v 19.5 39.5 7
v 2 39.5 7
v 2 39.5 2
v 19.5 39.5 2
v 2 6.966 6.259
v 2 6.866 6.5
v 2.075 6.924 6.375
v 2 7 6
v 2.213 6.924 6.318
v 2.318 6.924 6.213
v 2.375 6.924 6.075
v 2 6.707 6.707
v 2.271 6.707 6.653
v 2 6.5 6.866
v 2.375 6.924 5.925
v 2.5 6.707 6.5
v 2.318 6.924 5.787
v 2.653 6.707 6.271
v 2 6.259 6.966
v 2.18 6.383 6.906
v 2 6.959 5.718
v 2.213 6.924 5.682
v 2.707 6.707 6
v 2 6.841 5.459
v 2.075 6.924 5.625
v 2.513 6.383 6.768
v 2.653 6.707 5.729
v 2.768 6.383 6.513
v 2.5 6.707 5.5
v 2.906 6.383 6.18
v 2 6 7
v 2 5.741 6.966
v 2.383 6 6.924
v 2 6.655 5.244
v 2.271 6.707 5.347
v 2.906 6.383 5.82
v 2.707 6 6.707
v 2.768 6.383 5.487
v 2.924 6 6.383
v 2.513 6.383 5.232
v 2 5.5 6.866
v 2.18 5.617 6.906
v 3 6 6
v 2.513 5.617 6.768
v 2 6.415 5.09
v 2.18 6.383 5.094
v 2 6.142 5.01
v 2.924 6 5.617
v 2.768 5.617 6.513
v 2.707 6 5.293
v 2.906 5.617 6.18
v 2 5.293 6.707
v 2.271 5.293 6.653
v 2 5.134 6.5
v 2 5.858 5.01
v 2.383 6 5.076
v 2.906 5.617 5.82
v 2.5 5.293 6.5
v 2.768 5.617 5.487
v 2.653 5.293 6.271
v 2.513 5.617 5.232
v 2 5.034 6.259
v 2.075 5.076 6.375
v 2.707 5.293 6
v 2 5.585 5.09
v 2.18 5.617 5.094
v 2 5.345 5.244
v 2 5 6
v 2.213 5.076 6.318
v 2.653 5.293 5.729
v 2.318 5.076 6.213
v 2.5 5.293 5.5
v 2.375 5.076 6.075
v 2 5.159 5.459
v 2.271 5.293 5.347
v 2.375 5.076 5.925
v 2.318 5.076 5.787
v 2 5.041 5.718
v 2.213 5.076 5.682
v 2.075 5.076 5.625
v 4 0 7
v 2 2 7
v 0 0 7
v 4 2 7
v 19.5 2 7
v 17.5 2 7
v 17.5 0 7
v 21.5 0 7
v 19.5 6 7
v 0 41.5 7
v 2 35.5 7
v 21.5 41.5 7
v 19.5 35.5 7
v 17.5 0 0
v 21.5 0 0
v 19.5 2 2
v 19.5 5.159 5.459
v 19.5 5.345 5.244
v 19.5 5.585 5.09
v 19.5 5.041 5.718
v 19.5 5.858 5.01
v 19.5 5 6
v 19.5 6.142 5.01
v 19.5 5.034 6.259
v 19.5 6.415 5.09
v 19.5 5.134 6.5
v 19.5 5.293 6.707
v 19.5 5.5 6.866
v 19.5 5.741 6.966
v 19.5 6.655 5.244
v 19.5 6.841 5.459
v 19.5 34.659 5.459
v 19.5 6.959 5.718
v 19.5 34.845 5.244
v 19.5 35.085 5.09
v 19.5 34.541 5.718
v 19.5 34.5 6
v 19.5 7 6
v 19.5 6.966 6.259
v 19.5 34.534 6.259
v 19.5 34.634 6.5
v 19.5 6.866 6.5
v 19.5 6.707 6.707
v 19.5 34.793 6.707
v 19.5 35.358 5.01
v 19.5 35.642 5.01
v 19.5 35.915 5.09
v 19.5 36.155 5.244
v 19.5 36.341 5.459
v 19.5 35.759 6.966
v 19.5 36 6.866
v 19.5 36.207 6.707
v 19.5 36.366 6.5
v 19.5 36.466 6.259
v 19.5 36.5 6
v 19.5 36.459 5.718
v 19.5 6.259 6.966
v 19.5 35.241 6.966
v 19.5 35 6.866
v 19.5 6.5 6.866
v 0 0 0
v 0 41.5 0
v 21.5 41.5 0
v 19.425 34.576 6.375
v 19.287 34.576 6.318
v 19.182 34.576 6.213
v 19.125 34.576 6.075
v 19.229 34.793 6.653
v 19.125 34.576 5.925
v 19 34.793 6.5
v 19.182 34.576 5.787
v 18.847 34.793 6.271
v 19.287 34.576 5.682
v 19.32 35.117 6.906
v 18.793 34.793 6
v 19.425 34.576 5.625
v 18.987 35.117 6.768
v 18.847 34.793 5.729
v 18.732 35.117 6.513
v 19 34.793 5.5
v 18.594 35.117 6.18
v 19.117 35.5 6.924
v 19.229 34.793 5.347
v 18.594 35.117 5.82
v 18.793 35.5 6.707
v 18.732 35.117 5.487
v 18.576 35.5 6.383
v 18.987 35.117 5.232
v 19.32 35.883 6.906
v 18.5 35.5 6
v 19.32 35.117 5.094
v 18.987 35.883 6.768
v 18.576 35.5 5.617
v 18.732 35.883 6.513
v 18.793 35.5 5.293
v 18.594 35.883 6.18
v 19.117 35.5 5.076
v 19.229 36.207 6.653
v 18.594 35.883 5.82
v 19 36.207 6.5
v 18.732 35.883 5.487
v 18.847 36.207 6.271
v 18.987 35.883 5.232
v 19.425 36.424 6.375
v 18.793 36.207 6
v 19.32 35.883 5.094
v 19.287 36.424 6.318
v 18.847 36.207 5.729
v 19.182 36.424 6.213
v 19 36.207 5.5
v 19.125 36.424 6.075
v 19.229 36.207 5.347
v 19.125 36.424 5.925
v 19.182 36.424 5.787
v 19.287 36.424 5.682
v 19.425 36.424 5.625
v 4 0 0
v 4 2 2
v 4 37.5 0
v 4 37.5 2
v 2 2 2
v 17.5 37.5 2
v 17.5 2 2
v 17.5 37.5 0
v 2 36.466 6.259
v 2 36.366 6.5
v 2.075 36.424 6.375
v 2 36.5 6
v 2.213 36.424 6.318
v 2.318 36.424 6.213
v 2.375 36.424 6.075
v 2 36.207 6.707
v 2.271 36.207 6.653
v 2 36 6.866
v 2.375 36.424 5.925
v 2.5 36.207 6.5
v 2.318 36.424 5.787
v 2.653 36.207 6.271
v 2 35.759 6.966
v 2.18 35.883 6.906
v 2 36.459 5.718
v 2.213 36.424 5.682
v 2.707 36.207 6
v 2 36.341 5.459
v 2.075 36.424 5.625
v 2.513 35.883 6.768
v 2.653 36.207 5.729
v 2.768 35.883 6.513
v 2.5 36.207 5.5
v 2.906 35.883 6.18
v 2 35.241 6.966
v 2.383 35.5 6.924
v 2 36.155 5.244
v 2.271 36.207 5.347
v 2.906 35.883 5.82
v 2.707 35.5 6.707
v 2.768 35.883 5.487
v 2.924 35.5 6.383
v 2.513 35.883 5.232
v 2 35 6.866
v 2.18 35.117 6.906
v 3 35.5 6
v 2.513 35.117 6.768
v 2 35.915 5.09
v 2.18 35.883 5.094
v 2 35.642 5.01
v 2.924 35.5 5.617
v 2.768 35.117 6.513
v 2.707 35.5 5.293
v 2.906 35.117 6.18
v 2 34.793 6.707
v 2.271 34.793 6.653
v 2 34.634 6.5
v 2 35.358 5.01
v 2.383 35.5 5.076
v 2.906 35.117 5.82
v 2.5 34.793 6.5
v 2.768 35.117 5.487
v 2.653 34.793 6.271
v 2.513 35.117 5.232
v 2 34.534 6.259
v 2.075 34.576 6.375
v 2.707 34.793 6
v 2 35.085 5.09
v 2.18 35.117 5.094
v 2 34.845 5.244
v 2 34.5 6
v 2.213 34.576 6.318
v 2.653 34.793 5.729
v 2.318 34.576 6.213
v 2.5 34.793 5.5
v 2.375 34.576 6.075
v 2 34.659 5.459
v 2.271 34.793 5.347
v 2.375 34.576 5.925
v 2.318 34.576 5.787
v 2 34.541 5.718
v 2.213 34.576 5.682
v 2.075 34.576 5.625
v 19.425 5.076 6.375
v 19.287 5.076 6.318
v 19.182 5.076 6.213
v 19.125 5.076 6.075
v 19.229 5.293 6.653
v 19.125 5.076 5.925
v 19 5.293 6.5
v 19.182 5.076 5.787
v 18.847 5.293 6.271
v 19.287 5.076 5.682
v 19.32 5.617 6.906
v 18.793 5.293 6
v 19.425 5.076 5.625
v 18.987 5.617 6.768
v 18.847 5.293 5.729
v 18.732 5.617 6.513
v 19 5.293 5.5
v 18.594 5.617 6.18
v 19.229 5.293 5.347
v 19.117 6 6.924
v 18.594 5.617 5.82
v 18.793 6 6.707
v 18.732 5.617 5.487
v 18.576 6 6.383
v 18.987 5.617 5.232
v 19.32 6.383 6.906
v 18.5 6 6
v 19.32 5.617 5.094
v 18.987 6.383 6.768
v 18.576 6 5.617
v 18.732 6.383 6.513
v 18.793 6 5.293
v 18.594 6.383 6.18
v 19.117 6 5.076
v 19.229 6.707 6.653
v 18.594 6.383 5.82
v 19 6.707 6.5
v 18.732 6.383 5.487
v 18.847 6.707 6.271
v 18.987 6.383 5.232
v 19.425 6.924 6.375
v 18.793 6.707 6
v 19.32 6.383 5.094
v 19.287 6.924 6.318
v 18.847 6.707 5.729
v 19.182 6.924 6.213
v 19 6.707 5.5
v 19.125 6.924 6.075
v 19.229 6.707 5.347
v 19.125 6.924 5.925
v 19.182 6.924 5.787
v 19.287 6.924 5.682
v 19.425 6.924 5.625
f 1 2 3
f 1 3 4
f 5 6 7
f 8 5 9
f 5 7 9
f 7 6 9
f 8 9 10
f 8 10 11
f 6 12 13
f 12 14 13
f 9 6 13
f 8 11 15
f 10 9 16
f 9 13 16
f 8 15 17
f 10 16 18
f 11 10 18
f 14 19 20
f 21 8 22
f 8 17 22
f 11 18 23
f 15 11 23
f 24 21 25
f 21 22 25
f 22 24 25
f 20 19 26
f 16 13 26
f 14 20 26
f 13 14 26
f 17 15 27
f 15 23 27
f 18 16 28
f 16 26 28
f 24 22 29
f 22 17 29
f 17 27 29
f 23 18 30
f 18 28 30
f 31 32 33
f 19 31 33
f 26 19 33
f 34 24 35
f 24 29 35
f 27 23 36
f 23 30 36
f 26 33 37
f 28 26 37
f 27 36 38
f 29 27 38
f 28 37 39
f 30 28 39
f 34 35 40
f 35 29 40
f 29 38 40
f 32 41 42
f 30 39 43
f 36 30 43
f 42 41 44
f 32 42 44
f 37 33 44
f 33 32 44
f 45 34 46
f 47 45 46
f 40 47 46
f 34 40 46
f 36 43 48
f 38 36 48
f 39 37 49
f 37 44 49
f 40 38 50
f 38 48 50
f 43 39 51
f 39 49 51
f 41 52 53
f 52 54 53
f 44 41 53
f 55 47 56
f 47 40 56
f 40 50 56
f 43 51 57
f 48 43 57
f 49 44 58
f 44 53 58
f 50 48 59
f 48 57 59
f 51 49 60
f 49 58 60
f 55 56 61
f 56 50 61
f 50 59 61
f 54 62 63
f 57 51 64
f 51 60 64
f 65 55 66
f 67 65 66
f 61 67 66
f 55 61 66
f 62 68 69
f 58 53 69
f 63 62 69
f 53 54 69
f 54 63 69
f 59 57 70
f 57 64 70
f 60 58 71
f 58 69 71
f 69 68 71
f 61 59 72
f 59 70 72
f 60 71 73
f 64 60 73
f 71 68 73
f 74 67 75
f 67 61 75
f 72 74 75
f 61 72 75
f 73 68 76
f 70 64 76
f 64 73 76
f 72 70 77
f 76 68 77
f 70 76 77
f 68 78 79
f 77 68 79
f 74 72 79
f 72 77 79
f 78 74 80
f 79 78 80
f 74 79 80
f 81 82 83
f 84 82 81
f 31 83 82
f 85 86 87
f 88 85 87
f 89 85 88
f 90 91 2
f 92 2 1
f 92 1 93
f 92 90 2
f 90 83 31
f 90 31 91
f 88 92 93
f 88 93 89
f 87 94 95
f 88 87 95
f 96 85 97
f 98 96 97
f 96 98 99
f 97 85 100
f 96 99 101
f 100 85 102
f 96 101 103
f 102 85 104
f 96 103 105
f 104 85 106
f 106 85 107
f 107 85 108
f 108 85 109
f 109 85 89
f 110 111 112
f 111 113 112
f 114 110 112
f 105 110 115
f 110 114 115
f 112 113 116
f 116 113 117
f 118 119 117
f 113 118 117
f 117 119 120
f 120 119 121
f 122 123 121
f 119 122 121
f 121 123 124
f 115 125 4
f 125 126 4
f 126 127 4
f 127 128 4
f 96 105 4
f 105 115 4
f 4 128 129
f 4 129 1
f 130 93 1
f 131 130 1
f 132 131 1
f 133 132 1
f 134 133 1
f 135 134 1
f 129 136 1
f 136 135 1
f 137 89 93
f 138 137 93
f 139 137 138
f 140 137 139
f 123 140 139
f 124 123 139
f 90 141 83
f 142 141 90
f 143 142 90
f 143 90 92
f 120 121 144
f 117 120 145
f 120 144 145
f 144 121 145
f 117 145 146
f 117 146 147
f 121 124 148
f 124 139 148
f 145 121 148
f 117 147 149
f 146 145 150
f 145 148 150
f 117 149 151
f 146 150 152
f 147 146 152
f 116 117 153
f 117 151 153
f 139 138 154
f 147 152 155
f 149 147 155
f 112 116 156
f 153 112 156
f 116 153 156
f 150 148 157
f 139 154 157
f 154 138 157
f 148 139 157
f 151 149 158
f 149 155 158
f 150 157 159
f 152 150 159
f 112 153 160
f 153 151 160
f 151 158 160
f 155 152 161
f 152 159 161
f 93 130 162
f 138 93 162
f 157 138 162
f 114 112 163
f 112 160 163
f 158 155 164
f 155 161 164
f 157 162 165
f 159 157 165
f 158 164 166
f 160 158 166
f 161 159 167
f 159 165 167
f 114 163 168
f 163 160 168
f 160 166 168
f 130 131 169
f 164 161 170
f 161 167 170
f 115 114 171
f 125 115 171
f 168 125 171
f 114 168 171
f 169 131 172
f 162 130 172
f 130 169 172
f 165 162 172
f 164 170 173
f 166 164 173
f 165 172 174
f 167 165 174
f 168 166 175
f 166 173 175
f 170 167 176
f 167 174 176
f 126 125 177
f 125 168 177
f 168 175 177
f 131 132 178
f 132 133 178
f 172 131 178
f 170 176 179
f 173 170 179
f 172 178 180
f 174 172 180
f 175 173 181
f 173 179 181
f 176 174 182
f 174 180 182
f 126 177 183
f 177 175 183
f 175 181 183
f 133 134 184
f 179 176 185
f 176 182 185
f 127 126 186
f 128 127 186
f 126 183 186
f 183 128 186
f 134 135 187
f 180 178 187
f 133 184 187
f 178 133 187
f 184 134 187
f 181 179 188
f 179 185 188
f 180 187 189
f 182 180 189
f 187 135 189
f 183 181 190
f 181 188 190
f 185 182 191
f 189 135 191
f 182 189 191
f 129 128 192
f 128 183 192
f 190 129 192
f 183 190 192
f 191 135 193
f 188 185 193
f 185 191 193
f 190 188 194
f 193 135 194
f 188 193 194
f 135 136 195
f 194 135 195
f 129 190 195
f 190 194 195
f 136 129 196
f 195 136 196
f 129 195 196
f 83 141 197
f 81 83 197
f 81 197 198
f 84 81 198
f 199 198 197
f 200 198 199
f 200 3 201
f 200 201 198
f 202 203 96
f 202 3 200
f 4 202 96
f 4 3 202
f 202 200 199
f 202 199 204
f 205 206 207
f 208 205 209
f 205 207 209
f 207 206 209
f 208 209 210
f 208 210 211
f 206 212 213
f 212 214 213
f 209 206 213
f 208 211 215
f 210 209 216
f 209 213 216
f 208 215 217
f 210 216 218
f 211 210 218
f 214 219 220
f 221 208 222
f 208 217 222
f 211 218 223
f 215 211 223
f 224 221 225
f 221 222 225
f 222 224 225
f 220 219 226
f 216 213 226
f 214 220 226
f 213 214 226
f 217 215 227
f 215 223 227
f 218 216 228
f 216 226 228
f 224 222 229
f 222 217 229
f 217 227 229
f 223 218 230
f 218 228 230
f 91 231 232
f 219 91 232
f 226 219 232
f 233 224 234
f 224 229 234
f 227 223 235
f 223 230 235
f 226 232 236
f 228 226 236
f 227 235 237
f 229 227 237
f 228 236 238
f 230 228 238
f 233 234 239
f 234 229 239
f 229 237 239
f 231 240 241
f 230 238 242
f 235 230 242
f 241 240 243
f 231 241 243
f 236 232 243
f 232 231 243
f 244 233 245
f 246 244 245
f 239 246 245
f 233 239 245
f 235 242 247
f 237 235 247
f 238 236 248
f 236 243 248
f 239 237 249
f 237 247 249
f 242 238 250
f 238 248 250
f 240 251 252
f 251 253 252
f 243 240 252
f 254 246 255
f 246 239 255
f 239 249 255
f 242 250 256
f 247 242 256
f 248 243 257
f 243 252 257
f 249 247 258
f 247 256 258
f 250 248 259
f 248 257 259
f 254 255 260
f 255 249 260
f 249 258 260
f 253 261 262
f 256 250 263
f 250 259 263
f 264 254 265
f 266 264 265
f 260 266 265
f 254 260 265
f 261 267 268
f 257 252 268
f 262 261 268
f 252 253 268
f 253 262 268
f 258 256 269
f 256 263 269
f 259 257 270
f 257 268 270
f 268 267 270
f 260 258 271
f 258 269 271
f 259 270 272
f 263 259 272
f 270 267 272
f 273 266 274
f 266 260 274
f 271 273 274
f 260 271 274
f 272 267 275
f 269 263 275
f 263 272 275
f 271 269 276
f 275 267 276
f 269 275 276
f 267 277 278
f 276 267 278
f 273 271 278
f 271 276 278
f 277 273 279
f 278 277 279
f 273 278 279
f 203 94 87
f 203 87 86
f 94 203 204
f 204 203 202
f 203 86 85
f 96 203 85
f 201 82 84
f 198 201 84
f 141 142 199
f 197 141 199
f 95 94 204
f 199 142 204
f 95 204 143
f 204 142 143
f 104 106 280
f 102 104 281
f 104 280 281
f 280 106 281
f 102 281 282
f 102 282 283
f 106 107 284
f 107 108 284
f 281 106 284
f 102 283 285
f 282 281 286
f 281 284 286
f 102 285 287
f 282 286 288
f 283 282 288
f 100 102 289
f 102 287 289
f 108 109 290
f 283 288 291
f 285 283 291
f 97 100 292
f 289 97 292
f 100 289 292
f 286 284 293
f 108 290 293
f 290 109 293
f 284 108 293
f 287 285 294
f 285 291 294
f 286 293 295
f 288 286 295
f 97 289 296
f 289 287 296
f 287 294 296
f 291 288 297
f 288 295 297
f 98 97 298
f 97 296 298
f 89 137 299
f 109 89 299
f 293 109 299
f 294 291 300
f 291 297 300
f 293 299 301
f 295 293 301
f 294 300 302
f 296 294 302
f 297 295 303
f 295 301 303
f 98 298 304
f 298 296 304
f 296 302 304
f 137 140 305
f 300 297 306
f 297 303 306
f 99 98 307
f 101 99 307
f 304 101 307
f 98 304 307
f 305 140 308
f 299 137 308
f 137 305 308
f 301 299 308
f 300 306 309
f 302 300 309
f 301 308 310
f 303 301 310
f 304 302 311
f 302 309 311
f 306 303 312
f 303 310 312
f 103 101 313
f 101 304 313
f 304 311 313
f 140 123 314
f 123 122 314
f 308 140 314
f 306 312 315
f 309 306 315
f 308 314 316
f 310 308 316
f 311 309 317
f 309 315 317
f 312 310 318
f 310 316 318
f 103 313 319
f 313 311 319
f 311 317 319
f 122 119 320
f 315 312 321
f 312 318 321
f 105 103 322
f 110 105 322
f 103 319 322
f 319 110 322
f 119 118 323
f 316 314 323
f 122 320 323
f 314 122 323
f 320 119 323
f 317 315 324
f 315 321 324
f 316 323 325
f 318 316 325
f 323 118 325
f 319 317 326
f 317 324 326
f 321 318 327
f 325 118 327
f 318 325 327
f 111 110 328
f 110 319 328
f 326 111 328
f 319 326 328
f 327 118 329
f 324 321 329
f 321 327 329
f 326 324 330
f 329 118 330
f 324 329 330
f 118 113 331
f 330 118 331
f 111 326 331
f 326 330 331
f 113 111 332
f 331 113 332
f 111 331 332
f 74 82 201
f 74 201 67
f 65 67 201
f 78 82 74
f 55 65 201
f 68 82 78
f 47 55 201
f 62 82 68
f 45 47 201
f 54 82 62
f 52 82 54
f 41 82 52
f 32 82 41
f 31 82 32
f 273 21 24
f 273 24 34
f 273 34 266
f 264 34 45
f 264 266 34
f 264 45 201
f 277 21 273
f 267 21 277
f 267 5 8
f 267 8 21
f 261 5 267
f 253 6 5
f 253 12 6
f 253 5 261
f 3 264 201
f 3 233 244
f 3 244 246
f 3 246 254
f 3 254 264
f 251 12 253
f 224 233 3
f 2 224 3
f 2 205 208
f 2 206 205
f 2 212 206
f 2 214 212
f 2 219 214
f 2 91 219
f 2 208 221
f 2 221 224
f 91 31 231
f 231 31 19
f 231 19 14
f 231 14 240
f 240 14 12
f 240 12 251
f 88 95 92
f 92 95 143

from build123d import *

# Parameters (mm, degrees)
SKETCH080_W         = 21.5
SKETCH080_H         = 41.5
PAD036_DEPTH        = 7
SKETCH081_W         = 17.5
SKETCH081_H         = 37.5
POCKET027_DEPTH     = 5
SKETCH077_W         = 13.5
SKETCH077_H         = 33.5
POCKET028_DEPTH     = 2.001
SKETCH078_W         = 13.5
SKETCH078_H         = 4
POCKET026_DEPTH     = 7.001
REVOLUTION010_ANGLE = -180
REVOLUTION011_ANGLE = -180


with BuildPart() as part:
    # Sketch080 → Pad036 (new body)
    with BuildSketch(Plane.XY):
        with Locations((10.75, 20.75)):
            Rectangle(SKETCH080_W, SKETCH080_H)
    extrude(amount=PAD036_DEPTH)

    # Sketch081 (on Face6 of Pad036) → Pocket027 (cut)
    with BuildSketch(Plane.XY.offset(7)):
        with Locations((10.75, 20.75)):
            Rectangle(SKETCH081_W, SKETCH081_H)
    extrude(amount=-POCKET027_DEPTH, mode=Mode.SUBTRACT)

    # Sketch077 (on Face11 of Pocket027) → Pocket028 (cut, through all)
    with BuildSketch(Plane.XY.offset(2)):
        with Locations((10.75, 20.75)):
            Rectangle(SKETCH077_W, SKETCH077_H)
    extrude(amount=-POCKET028_DEPTH, mode=Mode.SUBTRACT)

    # Sketch078 (on Face5 of Pocket028) → Pocket026 (cut, through all)
    with BuildSketch(Plane.XY.offset(7)):
        with Locations((10.75, 2)):
            Rectangle(SKETCH078_W, SKETCH078_H)
    extrude(amount=-POCKET026_DEPTH, mode=Mode.SUBTRACT)

    # Sketch082 (on Face18 of Pocket026) → Revolution010 (revolve)
    with BuildSketch(Plane.YZ.offset(2)):
        with BuildLine():
            ThreePointArc((7, 6), (6, 7), (5, 6))
            Line((5, 6), (7, 6))
        make_face()
        with BuildLine():
            ThreePointArc((36.5, 6), (35.5, 7), (34.5, 6))
            Line((34.5, 6), (36.5, 6))
        make_face()
    revolve(axis=Axis((2, 34.5, 6), (0, -1, 0)), revolution_arc=REVOLUTION010_ANGLE)

    # Sketch083 (on Face17 of Revolution010) → Revolution011 (revolve)
    with BuildSketch(Plane(origin=(19.5, 0, 0), x_dir=(0, -1, 0), z_dir=(-1, 0, 0))):
        with BuildLine():
            ThreePointArc((-34.5, 6), (-35.5, 7), (-36.5, 6))
            Line((-36.5, 6), (-34.5, 6))
        make_face()
        with BuildLine():
            ThreePointArc((-5, 6), (-6, 7), (-7, 6))
            Line((-7, 6), (-5, 6))
        make_face()
    revolve(axis=Axis((19.5, 7, 6), (0, 1, 0)), revolution_arc=REVOLUTION011_ANGLE)


solid = part.part
